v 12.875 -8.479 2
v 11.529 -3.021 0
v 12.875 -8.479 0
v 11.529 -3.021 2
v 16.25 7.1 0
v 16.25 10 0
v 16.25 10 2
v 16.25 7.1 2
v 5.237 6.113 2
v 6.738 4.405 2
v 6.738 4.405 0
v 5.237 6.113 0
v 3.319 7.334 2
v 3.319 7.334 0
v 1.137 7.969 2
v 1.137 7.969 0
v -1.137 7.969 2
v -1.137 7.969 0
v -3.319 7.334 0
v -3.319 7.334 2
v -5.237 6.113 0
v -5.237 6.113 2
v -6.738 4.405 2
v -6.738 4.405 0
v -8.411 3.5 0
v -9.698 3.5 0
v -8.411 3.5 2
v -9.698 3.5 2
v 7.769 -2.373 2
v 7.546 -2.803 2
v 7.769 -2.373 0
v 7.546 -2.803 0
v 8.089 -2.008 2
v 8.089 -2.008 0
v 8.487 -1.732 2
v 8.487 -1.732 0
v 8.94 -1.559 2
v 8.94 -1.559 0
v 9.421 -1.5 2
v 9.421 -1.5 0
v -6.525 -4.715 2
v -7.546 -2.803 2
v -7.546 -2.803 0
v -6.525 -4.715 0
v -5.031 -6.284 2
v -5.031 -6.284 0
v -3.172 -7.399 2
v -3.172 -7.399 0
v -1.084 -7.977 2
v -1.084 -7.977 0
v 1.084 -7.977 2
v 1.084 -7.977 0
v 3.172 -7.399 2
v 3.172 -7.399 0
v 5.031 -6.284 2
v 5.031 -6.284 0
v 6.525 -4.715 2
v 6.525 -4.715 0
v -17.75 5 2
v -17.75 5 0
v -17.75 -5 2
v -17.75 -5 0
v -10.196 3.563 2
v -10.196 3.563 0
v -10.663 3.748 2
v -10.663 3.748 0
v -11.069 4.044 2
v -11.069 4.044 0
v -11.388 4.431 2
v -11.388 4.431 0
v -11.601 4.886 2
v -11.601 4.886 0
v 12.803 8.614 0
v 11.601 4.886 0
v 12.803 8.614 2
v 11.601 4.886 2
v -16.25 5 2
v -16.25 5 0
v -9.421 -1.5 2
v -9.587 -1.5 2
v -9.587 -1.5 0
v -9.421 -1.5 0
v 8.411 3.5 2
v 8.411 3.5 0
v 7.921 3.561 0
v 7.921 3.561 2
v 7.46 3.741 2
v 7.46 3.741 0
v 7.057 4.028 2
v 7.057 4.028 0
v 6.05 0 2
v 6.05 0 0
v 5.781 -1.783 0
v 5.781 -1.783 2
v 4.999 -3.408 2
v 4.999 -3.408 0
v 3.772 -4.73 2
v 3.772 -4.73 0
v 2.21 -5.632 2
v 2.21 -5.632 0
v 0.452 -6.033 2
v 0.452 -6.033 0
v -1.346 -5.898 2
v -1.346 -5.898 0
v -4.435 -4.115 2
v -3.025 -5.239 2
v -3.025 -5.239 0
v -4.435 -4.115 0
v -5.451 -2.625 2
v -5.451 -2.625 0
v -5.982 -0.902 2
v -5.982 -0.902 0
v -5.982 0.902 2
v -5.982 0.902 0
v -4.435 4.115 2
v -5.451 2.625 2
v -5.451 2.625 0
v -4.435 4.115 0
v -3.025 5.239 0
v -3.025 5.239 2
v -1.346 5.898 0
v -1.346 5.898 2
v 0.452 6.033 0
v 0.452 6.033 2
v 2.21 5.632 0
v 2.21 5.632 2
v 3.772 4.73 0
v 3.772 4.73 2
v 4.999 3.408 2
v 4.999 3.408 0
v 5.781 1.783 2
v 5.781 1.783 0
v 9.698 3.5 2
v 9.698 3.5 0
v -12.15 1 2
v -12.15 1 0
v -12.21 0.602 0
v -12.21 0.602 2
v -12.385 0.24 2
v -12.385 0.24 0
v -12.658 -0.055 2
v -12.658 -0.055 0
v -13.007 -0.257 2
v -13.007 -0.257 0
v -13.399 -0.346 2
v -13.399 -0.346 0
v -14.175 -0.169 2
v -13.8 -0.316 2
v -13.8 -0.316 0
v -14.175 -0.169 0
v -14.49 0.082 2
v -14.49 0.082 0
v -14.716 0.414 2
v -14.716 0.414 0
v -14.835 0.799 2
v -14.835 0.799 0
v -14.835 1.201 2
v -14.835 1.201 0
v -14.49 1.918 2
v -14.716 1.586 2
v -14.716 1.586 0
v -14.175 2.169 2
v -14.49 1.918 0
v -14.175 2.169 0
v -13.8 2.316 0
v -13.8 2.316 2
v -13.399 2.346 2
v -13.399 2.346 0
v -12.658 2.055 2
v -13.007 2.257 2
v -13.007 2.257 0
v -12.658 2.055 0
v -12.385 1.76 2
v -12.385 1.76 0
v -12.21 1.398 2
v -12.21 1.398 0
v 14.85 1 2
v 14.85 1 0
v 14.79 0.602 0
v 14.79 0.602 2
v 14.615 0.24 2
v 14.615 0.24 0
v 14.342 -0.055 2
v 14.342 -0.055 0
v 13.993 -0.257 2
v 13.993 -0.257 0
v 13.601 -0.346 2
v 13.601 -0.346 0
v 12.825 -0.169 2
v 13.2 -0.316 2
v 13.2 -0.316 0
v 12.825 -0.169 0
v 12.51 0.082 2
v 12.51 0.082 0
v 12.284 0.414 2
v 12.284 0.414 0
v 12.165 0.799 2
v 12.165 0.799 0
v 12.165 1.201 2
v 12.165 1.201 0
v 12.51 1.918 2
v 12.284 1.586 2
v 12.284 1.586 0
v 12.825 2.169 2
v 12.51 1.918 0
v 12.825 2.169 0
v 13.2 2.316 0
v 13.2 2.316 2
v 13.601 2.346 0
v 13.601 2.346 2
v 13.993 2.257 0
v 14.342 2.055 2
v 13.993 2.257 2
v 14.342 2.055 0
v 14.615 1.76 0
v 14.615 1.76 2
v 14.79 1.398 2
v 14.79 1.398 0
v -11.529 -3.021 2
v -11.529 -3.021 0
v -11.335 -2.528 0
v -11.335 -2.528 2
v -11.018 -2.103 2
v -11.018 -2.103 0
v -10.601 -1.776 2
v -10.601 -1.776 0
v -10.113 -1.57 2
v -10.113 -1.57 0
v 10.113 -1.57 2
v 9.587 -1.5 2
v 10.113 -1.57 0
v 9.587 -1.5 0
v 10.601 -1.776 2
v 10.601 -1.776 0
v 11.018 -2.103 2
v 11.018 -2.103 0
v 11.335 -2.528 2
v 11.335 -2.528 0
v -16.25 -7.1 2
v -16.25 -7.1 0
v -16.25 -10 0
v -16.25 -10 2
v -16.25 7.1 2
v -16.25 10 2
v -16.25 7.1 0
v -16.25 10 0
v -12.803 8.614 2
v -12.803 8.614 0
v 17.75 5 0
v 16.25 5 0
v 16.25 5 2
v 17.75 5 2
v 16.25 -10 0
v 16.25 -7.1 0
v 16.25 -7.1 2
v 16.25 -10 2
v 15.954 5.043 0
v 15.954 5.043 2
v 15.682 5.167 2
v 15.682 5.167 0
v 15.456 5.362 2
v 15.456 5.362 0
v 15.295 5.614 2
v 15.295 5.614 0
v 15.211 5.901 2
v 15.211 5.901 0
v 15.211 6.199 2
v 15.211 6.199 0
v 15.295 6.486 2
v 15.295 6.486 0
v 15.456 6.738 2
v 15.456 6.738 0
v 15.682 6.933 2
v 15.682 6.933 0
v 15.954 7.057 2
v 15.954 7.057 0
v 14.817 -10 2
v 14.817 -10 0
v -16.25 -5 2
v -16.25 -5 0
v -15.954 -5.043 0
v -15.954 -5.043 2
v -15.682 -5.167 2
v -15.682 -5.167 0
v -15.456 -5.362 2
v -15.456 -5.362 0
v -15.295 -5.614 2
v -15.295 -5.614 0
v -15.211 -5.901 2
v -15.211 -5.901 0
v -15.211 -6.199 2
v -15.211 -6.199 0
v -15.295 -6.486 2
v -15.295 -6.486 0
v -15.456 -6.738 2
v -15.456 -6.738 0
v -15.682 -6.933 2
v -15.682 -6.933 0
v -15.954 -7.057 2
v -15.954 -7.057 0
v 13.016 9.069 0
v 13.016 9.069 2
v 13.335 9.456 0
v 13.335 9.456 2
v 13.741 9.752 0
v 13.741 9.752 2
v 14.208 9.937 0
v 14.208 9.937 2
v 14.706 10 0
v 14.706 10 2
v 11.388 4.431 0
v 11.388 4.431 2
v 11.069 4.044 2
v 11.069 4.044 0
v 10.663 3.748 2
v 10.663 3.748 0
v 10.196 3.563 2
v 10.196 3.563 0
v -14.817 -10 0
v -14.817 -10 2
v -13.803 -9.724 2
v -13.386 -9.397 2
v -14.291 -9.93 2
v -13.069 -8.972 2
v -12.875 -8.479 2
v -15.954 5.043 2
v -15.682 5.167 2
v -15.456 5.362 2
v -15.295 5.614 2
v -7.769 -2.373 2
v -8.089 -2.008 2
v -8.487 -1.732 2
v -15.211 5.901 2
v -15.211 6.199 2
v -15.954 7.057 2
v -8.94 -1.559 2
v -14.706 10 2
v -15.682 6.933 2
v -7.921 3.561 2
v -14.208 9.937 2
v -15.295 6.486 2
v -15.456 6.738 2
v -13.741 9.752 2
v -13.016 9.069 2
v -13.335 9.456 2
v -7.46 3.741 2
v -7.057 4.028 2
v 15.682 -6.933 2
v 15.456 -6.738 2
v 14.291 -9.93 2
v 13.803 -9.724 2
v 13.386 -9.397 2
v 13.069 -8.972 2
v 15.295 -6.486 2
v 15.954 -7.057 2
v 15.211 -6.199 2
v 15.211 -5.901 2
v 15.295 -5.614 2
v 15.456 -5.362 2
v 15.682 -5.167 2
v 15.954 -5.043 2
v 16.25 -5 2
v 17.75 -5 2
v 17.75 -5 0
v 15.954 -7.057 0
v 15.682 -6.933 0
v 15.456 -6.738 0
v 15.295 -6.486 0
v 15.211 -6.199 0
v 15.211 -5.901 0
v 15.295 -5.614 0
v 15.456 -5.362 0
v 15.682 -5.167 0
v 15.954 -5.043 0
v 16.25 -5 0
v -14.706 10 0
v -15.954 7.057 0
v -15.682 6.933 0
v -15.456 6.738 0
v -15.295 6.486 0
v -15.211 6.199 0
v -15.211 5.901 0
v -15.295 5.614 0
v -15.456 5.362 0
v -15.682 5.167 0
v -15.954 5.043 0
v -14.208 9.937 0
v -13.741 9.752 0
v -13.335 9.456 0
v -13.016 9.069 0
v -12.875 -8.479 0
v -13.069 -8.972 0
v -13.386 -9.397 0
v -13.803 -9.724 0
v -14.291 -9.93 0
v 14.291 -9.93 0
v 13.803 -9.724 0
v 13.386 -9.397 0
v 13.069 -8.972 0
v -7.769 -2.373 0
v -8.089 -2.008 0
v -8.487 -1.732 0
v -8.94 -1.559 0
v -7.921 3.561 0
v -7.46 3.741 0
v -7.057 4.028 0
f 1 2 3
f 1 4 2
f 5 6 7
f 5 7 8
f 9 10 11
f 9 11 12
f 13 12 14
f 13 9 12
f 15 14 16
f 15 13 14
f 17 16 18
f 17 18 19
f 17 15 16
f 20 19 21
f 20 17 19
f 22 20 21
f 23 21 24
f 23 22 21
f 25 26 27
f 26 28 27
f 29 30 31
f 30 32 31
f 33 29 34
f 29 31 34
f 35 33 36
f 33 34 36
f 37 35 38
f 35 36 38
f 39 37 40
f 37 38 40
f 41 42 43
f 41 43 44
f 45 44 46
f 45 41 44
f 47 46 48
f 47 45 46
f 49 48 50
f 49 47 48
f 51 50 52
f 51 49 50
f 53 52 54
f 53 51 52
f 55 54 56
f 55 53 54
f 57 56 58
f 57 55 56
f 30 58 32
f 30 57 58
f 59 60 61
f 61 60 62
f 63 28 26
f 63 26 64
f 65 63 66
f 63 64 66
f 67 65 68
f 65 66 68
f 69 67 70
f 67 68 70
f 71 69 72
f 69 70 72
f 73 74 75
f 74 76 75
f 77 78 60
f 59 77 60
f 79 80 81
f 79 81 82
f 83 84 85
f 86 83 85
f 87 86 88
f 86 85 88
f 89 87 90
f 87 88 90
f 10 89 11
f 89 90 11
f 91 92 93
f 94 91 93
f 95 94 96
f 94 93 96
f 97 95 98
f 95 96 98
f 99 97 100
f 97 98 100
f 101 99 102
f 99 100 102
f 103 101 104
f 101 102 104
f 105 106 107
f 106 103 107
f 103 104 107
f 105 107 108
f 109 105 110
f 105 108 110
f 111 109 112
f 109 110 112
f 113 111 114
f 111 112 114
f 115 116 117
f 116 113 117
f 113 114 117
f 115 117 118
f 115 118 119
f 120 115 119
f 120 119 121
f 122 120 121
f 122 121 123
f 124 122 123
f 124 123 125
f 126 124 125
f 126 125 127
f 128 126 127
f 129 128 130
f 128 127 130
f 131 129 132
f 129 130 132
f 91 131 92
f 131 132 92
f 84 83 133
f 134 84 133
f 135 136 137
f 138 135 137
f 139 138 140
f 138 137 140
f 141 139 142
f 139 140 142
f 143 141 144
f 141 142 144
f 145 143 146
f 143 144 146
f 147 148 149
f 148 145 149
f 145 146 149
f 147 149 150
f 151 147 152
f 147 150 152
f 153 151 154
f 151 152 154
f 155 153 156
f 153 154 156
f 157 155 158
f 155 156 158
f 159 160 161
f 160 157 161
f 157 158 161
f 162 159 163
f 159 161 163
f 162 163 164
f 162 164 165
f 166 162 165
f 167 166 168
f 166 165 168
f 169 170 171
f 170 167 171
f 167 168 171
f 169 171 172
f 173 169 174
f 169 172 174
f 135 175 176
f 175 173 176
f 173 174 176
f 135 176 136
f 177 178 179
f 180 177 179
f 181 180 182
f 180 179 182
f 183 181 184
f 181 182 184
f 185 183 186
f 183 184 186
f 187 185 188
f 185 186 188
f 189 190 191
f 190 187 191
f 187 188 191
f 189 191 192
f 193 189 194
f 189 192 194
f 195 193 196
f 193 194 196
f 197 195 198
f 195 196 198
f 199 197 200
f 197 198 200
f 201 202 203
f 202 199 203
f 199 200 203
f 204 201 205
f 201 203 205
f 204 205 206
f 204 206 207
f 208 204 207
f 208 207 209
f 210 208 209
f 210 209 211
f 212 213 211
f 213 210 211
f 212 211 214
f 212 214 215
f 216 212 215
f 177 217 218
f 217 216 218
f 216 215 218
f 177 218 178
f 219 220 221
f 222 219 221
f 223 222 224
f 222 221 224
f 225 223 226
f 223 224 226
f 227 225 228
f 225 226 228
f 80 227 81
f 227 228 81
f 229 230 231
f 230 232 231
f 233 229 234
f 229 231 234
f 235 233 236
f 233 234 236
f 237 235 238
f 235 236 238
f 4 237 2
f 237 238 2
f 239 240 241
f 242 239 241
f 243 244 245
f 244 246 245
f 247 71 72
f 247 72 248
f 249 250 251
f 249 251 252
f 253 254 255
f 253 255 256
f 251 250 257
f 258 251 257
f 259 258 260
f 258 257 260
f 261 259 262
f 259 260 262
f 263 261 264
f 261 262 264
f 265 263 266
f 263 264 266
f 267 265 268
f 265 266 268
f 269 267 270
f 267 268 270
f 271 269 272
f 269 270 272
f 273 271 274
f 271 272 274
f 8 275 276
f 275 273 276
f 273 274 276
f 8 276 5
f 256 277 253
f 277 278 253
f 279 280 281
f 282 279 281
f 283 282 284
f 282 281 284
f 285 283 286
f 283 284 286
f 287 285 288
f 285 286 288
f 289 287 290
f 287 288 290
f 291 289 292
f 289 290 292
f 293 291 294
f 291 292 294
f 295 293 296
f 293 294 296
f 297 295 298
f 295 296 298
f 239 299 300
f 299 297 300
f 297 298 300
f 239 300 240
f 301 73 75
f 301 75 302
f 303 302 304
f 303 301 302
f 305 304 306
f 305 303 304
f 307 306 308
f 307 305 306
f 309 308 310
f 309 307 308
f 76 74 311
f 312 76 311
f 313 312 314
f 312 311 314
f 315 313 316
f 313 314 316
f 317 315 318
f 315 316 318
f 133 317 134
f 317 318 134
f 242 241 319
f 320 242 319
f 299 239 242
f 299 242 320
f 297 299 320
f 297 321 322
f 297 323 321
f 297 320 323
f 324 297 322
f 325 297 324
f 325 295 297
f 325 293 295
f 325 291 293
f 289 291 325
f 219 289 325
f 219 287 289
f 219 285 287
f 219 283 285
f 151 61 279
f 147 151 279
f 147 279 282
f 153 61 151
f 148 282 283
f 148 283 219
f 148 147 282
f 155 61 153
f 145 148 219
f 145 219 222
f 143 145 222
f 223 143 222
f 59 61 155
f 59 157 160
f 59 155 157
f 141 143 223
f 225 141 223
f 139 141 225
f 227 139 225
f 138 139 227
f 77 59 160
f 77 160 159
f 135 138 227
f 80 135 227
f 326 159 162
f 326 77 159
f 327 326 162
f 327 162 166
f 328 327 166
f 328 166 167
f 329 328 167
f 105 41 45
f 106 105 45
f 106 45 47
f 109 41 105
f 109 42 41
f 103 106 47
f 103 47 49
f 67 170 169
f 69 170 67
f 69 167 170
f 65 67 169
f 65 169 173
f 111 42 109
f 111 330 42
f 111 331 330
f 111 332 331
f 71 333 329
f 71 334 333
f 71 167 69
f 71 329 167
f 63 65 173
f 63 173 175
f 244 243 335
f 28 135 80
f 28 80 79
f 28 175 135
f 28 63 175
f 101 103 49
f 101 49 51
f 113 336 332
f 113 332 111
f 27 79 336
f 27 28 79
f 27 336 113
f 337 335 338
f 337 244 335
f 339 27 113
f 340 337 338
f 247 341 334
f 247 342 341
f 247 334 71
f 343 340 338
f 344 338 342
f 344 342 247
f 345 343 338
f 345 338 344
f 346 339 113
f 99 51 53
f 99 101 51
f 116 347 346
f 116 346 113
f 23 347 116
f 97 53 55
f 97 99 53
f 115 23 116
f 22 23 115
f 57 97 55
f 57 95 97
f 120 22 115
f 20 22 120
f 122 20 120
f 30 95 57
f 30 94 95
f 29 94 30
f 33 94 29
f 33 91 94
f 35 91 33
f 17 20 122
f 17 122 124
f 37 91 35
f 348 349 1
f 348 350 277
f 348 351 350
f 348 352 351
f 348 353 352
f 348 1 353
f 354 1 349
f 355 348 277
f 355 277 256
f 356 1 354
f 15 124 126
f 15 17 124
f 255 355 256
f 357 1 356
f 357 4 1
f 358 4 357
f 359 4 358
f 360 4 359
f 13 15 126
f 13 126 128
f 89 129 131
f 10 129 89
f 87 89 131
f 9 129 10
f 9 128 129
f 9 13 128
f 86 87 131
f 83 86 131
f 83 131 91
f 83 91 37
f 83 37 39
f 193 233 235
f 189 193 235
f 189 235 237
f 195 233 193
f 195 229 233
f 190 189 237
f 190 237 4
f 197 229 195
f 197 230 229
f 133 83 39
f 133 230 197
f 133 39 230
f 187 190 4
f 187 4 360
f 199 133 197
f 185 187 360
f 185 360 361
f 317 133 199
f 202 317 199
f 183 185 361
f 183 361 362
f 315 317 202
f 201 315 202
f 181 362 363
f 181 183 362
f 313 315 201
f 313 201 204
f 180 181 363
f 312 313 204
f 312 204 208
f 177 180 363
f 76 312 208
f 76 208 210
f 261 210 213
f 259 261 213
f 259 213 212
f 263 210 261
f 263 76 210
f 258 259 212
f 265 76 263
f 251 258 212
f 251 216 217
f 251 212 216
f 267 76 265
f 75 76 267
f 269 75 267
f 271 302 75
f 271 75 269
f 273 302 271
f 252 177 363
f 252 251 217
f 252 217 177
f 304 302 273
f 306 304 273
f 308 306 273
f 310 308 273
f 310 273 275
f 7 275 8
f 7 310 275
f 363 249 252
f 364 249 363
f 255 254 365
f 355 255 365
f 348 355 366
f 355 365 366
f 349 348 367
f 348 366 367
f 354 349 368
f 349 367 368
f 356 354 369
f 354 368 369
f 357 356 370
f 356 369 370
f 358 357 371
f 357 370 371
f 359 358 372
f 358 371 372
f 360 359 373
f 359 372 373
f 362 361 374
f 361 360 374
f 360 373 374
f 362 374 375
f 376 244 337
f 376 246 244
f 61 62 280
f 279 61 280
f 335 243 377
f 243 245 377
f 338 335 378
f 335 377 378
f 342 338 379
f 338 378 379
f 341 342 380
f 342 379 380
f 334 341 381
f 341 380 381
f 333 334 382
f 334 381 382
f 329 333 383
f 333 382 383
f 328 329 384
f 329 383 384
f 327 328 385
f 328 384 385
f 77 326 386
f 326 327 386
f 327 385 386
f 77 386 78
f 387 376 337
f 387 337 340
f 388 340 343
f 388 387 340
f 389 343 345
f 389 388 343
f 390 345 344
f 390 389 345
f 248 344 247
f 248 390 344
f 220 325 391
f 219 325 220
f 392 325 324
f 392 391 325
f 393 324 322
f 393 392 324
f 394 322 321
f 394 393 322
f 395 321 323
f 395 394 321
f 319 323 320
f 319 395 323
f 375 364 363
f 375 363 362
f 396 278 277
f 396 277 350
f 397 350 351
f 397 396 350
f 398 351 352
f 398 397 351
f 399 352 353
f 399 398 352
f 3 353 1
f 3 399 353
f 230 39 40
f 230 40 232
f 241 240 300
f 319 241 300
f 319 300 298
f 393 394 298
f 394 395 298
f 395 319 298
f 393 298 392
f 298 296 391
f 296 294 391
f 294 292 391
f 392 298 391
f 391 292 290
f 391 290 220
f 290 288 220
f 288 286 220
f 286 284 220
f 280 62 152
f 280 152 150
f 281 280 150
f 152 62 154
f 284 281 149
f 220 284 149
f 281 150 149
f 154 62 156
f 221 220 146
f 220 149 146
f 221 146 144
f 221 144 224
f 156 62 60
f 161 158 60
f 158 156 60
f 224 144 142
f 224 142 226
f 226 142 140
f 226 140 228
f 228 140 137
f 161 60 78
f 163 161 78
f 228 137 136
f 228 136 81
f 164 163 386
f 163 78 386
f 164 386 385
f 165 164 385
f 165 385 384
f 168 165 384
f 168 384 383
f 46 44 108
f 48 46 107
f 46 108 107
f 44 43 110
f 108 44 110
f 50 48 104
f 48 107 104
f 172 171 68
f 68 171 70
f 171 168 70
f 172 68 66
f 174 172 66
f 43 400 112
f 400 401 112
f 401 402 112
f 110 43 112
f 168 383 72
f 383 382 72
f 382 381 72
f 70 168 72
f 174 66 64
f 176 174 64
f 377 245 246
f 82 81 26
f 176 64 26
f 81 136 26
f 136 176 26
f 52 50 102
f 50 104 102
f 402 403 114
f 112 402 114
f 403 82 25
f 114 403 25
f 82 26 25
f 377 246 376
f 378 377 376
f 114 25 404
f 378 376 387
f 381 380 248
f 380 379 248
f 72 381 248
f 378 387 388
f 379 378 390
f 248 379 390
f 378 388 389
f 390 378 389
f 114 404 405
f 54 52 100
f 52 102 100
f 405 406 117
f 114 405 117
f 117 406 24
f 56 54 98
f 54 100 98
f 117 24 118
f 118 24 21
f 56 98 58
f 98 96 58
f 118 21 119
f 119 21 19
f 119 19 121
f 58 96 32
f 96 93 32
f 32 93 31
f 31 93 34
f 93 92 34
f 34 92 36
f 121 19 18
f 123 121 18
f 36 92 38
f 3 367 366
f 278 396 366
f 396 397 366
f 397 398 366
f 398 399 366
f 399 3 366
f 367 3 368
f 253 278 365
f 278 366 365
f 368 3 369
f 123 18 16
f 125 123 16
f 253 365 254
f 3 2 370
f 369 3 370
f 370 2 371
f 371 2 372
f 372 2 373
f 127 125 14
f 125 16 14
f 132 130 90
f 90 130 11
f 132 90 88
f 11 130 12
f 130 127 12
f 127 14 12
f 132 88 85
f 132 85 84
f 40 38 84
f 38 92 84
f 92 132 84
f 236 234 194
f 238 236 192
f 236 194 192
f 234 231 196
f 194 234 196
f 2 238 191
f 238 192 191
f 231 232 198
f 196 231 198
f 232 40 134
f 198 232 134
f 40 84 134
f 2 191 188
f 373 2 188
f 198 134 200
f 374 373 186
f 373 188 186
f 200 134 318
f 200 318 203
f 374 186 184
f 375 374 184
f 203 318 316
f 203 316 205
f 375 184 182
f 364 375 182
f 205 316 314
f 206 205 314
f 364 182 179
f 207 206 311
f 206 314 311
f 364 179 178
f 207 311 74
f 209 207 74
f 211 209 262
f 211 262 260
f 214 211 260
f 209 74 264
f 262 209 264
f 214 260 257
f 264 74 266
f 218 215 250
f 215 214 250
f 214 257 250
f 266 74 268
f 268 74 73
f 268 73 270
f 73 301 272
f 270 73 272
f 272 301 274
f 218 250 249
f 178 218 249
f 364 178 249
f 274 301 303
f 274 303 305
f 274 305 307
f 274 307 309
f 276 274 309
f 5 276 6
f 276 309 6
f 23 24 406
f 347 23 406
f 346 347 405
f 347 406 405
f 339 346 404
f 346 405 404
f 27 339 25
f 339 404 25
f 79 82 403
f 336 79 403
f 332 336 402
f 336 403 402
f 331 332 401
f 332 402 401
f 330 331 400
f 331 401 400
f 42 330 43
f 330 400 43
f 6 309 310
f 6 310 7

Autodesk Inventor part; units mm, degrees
ref_plane "YZ Plane" through (0, 0, 0) normal (1, 0, 0) x (0, 1, 0)
ref_plane "XZ Plane" through (0, 0, 0) normal (0, 1, 0) x (-1, 0, 0)
ref_plane "XY Plane" through (0, 0, 0) normal (0, 0, 1) x (1, 0, 0)
sketch "スケッチ1" plane through (0, 0, 0) normal (0, 0, 1) x (1, 0, 0)
  circle A0 centre (0, 0) radius 10.5 construction
  circle A1 centre (-13.5, 1) radius 1.35
  line L0 (-13.5, 28) -> (13.5, 28) construction
  line L1 (13.5, 28) -> (13.5, 1) construction
  line L2 (13.5, 1) -> (-13.5, 1) construction
  line L3 (-13.5, 1) -> (-13.5, 28) construction
  circle A2 centre (-13.5, 28) radius 1.35
  circle A3 centre (13.5, 1) radius 1.35
  circle A4 centre (13.5, 28) radius 1.35
  line L4 (-16.25, 10) -> (-16.25, 7.1)
  line L5 (-16.25, 10) -> (16.25, 10)
  line L6 (16.25, 10) -> (16.25, 7.1)
  line L7 (-16.25, -7.1) -> (-16.25, -10)
  line L8 (-16.25, -10) -> (16.25, -10)
  line L9 (16.25, -7.1) -> (16.25, -10)
  line L10 (-16.25, 5) -> (-17.75, 5)
  line L11 (-17.75, 5) -> (-17.75, -5)
  line L12 (-17.75, -5) -> (-16.25, -5)
  arc A5 (-16.25, 5) -> (-16.25, 7.1) centre (-16.25, 6.05) ccw
  arc A6 (-16.25, -7.1) -> (-16.25, -5) centre (-16.25, -6.05) ccw
  line L13 (16.25, 5) -> (17.75, 5)
  line L14 (17.75, 5) -> (17.75, -5)
  line L15 (17.75, -5) -> (16.25, -5)
  arc A7 (16.25, 7.1) -> (16.25, 5) centre (16.25, 6.05) ccw
  line L16 (0, 28) -> (0, 0) construction
  arc A8 (16.25, -5) -> (16.25, -7.1) centre (16.25, -6.05) ccw
  line L17 (-17.75, 0) -> (17.75, 0) construction
  circle A9 centre (0, 0) radius 6.05
  point P0 (0, 10)
  dimension "d8" = 21
  dimension "d10" = 27
  dimension "d12" = 1
  dimension "d13" = 2.7
  dimension "d38" = 27
  dimension "d44" = 27
  dimension "d47" = 1.05
  dimension "d48" = 32.5
  dimension "d49" = 1.5
  dimension "d50" = 10
  dimension "d51" = 5
  dimension "d52" = 12.1
  dimension "d64" = 1.5
extrude "押し出し1" add sketch "スケッチ1" along normal blind 2 contours L5 L6 A7 L13 L14 L15 A8 L9 L8 L7 A6 L12 L11 L10 A5 L4
sketch "スケッチ3" plane through (0, 0, 2) normal (0, 0, 1) x (1, 0, 0)
  circle A0 centre (0, 0) radius 6.05 projected
  circle A1 centre (13.5, 1) radius 1.35 projected
  circle A2 centre (-13.5, 1) radius 1.35 projected
  line L0 (16.25, 10) -> (-16.25, 10) projected
  line L1 (-11.154, 3.5) -> (-7.2493, 3.5)
  line L2 (-11.154, -1.5) -> (-7.909, -1.5)
  line L3 (-13.5, 1) -> (13.5, 1) construction
  arc A3 (7.2493, 3.5) -> (-7.2493, 3.5) centre (0, 0) ccw
  line L4 (7.2493, 3.5) -> (11.154, 3.5)
  line L5 (-14.3875, 13.5275) -> (14.3875, 13.5275)
  line L6 (0, 0) -> (0, 10) construction
  arc A4 (-7.909, -1.5) -> (7.909, -1.5) centre (0, 0) ccw
  line L7 (7.909, -1.5) -> (11.154, -1.5)
  line L8 (14.3875, -14.6128) -> (-14.3875, -14.6128)
  line L9 (-16.25, -10) -> (16.25, -10) projected
  line L10 (-14.3875, -14.6128) -> (-11.154, -1.5)
  line L11 (-11.154, 3.5) -> (-14.3875, 13.5275)
  circle A5 centre (-13.5, 1) radius 3 construction
  line L12 (11.154, -1.5) -> (14.3875, -14.6128)
  line L13 (11.154, 3.5) -> (14.3875, 13.5275)
  line L14 (-13.25, 10) -> (-16.25, 10) construction
  line L15 (-13.25, -10) -> (-16.25, -10) construction
  line L16 (13.25, 10) -> (16.25, 10) construction
  line L17 (16.25, -10) -> (13.25, -10) construction
  dimension "d68" = 2.5
  dimension "d69" = 2
  dimension "d73" = 6
  dimension "d74" = 3
extrude "押し出し3" cut sketch "スケッチ3" against normal blind 10 contours L13 L4 A3 L1 L11 L0 | L2 A4 L7 L12 L9 L10
fillet "フィレット2" radius 2 12 edges at (-11.154, 3.5, 1) (-7.2493, 3.5, 1) (7.909, -1.5, 1) (7.2493, 3.5, 1) (11.154, 3.5, 1) (-7.909, -1.5, 1) (-11.154, -1.5, 1) (11.154, -1.5, 1) (-13.25, -10, 1) (-13.25, 10, 1) (13.25, -10, 1) (13.25, 10, 1)
equation "\"d38\" = d10"
equation "\"d44\" = d10"
equation "\"d50\" = d11"
equation "\"d51\" = d28"
equation "\"d64\" = d49"
equation "\"d11\" = 10"
equation "\"d28\" = 5"
properties part number "足首_サブフレーム_1_2" material "アルミニウム 2014-T4"
